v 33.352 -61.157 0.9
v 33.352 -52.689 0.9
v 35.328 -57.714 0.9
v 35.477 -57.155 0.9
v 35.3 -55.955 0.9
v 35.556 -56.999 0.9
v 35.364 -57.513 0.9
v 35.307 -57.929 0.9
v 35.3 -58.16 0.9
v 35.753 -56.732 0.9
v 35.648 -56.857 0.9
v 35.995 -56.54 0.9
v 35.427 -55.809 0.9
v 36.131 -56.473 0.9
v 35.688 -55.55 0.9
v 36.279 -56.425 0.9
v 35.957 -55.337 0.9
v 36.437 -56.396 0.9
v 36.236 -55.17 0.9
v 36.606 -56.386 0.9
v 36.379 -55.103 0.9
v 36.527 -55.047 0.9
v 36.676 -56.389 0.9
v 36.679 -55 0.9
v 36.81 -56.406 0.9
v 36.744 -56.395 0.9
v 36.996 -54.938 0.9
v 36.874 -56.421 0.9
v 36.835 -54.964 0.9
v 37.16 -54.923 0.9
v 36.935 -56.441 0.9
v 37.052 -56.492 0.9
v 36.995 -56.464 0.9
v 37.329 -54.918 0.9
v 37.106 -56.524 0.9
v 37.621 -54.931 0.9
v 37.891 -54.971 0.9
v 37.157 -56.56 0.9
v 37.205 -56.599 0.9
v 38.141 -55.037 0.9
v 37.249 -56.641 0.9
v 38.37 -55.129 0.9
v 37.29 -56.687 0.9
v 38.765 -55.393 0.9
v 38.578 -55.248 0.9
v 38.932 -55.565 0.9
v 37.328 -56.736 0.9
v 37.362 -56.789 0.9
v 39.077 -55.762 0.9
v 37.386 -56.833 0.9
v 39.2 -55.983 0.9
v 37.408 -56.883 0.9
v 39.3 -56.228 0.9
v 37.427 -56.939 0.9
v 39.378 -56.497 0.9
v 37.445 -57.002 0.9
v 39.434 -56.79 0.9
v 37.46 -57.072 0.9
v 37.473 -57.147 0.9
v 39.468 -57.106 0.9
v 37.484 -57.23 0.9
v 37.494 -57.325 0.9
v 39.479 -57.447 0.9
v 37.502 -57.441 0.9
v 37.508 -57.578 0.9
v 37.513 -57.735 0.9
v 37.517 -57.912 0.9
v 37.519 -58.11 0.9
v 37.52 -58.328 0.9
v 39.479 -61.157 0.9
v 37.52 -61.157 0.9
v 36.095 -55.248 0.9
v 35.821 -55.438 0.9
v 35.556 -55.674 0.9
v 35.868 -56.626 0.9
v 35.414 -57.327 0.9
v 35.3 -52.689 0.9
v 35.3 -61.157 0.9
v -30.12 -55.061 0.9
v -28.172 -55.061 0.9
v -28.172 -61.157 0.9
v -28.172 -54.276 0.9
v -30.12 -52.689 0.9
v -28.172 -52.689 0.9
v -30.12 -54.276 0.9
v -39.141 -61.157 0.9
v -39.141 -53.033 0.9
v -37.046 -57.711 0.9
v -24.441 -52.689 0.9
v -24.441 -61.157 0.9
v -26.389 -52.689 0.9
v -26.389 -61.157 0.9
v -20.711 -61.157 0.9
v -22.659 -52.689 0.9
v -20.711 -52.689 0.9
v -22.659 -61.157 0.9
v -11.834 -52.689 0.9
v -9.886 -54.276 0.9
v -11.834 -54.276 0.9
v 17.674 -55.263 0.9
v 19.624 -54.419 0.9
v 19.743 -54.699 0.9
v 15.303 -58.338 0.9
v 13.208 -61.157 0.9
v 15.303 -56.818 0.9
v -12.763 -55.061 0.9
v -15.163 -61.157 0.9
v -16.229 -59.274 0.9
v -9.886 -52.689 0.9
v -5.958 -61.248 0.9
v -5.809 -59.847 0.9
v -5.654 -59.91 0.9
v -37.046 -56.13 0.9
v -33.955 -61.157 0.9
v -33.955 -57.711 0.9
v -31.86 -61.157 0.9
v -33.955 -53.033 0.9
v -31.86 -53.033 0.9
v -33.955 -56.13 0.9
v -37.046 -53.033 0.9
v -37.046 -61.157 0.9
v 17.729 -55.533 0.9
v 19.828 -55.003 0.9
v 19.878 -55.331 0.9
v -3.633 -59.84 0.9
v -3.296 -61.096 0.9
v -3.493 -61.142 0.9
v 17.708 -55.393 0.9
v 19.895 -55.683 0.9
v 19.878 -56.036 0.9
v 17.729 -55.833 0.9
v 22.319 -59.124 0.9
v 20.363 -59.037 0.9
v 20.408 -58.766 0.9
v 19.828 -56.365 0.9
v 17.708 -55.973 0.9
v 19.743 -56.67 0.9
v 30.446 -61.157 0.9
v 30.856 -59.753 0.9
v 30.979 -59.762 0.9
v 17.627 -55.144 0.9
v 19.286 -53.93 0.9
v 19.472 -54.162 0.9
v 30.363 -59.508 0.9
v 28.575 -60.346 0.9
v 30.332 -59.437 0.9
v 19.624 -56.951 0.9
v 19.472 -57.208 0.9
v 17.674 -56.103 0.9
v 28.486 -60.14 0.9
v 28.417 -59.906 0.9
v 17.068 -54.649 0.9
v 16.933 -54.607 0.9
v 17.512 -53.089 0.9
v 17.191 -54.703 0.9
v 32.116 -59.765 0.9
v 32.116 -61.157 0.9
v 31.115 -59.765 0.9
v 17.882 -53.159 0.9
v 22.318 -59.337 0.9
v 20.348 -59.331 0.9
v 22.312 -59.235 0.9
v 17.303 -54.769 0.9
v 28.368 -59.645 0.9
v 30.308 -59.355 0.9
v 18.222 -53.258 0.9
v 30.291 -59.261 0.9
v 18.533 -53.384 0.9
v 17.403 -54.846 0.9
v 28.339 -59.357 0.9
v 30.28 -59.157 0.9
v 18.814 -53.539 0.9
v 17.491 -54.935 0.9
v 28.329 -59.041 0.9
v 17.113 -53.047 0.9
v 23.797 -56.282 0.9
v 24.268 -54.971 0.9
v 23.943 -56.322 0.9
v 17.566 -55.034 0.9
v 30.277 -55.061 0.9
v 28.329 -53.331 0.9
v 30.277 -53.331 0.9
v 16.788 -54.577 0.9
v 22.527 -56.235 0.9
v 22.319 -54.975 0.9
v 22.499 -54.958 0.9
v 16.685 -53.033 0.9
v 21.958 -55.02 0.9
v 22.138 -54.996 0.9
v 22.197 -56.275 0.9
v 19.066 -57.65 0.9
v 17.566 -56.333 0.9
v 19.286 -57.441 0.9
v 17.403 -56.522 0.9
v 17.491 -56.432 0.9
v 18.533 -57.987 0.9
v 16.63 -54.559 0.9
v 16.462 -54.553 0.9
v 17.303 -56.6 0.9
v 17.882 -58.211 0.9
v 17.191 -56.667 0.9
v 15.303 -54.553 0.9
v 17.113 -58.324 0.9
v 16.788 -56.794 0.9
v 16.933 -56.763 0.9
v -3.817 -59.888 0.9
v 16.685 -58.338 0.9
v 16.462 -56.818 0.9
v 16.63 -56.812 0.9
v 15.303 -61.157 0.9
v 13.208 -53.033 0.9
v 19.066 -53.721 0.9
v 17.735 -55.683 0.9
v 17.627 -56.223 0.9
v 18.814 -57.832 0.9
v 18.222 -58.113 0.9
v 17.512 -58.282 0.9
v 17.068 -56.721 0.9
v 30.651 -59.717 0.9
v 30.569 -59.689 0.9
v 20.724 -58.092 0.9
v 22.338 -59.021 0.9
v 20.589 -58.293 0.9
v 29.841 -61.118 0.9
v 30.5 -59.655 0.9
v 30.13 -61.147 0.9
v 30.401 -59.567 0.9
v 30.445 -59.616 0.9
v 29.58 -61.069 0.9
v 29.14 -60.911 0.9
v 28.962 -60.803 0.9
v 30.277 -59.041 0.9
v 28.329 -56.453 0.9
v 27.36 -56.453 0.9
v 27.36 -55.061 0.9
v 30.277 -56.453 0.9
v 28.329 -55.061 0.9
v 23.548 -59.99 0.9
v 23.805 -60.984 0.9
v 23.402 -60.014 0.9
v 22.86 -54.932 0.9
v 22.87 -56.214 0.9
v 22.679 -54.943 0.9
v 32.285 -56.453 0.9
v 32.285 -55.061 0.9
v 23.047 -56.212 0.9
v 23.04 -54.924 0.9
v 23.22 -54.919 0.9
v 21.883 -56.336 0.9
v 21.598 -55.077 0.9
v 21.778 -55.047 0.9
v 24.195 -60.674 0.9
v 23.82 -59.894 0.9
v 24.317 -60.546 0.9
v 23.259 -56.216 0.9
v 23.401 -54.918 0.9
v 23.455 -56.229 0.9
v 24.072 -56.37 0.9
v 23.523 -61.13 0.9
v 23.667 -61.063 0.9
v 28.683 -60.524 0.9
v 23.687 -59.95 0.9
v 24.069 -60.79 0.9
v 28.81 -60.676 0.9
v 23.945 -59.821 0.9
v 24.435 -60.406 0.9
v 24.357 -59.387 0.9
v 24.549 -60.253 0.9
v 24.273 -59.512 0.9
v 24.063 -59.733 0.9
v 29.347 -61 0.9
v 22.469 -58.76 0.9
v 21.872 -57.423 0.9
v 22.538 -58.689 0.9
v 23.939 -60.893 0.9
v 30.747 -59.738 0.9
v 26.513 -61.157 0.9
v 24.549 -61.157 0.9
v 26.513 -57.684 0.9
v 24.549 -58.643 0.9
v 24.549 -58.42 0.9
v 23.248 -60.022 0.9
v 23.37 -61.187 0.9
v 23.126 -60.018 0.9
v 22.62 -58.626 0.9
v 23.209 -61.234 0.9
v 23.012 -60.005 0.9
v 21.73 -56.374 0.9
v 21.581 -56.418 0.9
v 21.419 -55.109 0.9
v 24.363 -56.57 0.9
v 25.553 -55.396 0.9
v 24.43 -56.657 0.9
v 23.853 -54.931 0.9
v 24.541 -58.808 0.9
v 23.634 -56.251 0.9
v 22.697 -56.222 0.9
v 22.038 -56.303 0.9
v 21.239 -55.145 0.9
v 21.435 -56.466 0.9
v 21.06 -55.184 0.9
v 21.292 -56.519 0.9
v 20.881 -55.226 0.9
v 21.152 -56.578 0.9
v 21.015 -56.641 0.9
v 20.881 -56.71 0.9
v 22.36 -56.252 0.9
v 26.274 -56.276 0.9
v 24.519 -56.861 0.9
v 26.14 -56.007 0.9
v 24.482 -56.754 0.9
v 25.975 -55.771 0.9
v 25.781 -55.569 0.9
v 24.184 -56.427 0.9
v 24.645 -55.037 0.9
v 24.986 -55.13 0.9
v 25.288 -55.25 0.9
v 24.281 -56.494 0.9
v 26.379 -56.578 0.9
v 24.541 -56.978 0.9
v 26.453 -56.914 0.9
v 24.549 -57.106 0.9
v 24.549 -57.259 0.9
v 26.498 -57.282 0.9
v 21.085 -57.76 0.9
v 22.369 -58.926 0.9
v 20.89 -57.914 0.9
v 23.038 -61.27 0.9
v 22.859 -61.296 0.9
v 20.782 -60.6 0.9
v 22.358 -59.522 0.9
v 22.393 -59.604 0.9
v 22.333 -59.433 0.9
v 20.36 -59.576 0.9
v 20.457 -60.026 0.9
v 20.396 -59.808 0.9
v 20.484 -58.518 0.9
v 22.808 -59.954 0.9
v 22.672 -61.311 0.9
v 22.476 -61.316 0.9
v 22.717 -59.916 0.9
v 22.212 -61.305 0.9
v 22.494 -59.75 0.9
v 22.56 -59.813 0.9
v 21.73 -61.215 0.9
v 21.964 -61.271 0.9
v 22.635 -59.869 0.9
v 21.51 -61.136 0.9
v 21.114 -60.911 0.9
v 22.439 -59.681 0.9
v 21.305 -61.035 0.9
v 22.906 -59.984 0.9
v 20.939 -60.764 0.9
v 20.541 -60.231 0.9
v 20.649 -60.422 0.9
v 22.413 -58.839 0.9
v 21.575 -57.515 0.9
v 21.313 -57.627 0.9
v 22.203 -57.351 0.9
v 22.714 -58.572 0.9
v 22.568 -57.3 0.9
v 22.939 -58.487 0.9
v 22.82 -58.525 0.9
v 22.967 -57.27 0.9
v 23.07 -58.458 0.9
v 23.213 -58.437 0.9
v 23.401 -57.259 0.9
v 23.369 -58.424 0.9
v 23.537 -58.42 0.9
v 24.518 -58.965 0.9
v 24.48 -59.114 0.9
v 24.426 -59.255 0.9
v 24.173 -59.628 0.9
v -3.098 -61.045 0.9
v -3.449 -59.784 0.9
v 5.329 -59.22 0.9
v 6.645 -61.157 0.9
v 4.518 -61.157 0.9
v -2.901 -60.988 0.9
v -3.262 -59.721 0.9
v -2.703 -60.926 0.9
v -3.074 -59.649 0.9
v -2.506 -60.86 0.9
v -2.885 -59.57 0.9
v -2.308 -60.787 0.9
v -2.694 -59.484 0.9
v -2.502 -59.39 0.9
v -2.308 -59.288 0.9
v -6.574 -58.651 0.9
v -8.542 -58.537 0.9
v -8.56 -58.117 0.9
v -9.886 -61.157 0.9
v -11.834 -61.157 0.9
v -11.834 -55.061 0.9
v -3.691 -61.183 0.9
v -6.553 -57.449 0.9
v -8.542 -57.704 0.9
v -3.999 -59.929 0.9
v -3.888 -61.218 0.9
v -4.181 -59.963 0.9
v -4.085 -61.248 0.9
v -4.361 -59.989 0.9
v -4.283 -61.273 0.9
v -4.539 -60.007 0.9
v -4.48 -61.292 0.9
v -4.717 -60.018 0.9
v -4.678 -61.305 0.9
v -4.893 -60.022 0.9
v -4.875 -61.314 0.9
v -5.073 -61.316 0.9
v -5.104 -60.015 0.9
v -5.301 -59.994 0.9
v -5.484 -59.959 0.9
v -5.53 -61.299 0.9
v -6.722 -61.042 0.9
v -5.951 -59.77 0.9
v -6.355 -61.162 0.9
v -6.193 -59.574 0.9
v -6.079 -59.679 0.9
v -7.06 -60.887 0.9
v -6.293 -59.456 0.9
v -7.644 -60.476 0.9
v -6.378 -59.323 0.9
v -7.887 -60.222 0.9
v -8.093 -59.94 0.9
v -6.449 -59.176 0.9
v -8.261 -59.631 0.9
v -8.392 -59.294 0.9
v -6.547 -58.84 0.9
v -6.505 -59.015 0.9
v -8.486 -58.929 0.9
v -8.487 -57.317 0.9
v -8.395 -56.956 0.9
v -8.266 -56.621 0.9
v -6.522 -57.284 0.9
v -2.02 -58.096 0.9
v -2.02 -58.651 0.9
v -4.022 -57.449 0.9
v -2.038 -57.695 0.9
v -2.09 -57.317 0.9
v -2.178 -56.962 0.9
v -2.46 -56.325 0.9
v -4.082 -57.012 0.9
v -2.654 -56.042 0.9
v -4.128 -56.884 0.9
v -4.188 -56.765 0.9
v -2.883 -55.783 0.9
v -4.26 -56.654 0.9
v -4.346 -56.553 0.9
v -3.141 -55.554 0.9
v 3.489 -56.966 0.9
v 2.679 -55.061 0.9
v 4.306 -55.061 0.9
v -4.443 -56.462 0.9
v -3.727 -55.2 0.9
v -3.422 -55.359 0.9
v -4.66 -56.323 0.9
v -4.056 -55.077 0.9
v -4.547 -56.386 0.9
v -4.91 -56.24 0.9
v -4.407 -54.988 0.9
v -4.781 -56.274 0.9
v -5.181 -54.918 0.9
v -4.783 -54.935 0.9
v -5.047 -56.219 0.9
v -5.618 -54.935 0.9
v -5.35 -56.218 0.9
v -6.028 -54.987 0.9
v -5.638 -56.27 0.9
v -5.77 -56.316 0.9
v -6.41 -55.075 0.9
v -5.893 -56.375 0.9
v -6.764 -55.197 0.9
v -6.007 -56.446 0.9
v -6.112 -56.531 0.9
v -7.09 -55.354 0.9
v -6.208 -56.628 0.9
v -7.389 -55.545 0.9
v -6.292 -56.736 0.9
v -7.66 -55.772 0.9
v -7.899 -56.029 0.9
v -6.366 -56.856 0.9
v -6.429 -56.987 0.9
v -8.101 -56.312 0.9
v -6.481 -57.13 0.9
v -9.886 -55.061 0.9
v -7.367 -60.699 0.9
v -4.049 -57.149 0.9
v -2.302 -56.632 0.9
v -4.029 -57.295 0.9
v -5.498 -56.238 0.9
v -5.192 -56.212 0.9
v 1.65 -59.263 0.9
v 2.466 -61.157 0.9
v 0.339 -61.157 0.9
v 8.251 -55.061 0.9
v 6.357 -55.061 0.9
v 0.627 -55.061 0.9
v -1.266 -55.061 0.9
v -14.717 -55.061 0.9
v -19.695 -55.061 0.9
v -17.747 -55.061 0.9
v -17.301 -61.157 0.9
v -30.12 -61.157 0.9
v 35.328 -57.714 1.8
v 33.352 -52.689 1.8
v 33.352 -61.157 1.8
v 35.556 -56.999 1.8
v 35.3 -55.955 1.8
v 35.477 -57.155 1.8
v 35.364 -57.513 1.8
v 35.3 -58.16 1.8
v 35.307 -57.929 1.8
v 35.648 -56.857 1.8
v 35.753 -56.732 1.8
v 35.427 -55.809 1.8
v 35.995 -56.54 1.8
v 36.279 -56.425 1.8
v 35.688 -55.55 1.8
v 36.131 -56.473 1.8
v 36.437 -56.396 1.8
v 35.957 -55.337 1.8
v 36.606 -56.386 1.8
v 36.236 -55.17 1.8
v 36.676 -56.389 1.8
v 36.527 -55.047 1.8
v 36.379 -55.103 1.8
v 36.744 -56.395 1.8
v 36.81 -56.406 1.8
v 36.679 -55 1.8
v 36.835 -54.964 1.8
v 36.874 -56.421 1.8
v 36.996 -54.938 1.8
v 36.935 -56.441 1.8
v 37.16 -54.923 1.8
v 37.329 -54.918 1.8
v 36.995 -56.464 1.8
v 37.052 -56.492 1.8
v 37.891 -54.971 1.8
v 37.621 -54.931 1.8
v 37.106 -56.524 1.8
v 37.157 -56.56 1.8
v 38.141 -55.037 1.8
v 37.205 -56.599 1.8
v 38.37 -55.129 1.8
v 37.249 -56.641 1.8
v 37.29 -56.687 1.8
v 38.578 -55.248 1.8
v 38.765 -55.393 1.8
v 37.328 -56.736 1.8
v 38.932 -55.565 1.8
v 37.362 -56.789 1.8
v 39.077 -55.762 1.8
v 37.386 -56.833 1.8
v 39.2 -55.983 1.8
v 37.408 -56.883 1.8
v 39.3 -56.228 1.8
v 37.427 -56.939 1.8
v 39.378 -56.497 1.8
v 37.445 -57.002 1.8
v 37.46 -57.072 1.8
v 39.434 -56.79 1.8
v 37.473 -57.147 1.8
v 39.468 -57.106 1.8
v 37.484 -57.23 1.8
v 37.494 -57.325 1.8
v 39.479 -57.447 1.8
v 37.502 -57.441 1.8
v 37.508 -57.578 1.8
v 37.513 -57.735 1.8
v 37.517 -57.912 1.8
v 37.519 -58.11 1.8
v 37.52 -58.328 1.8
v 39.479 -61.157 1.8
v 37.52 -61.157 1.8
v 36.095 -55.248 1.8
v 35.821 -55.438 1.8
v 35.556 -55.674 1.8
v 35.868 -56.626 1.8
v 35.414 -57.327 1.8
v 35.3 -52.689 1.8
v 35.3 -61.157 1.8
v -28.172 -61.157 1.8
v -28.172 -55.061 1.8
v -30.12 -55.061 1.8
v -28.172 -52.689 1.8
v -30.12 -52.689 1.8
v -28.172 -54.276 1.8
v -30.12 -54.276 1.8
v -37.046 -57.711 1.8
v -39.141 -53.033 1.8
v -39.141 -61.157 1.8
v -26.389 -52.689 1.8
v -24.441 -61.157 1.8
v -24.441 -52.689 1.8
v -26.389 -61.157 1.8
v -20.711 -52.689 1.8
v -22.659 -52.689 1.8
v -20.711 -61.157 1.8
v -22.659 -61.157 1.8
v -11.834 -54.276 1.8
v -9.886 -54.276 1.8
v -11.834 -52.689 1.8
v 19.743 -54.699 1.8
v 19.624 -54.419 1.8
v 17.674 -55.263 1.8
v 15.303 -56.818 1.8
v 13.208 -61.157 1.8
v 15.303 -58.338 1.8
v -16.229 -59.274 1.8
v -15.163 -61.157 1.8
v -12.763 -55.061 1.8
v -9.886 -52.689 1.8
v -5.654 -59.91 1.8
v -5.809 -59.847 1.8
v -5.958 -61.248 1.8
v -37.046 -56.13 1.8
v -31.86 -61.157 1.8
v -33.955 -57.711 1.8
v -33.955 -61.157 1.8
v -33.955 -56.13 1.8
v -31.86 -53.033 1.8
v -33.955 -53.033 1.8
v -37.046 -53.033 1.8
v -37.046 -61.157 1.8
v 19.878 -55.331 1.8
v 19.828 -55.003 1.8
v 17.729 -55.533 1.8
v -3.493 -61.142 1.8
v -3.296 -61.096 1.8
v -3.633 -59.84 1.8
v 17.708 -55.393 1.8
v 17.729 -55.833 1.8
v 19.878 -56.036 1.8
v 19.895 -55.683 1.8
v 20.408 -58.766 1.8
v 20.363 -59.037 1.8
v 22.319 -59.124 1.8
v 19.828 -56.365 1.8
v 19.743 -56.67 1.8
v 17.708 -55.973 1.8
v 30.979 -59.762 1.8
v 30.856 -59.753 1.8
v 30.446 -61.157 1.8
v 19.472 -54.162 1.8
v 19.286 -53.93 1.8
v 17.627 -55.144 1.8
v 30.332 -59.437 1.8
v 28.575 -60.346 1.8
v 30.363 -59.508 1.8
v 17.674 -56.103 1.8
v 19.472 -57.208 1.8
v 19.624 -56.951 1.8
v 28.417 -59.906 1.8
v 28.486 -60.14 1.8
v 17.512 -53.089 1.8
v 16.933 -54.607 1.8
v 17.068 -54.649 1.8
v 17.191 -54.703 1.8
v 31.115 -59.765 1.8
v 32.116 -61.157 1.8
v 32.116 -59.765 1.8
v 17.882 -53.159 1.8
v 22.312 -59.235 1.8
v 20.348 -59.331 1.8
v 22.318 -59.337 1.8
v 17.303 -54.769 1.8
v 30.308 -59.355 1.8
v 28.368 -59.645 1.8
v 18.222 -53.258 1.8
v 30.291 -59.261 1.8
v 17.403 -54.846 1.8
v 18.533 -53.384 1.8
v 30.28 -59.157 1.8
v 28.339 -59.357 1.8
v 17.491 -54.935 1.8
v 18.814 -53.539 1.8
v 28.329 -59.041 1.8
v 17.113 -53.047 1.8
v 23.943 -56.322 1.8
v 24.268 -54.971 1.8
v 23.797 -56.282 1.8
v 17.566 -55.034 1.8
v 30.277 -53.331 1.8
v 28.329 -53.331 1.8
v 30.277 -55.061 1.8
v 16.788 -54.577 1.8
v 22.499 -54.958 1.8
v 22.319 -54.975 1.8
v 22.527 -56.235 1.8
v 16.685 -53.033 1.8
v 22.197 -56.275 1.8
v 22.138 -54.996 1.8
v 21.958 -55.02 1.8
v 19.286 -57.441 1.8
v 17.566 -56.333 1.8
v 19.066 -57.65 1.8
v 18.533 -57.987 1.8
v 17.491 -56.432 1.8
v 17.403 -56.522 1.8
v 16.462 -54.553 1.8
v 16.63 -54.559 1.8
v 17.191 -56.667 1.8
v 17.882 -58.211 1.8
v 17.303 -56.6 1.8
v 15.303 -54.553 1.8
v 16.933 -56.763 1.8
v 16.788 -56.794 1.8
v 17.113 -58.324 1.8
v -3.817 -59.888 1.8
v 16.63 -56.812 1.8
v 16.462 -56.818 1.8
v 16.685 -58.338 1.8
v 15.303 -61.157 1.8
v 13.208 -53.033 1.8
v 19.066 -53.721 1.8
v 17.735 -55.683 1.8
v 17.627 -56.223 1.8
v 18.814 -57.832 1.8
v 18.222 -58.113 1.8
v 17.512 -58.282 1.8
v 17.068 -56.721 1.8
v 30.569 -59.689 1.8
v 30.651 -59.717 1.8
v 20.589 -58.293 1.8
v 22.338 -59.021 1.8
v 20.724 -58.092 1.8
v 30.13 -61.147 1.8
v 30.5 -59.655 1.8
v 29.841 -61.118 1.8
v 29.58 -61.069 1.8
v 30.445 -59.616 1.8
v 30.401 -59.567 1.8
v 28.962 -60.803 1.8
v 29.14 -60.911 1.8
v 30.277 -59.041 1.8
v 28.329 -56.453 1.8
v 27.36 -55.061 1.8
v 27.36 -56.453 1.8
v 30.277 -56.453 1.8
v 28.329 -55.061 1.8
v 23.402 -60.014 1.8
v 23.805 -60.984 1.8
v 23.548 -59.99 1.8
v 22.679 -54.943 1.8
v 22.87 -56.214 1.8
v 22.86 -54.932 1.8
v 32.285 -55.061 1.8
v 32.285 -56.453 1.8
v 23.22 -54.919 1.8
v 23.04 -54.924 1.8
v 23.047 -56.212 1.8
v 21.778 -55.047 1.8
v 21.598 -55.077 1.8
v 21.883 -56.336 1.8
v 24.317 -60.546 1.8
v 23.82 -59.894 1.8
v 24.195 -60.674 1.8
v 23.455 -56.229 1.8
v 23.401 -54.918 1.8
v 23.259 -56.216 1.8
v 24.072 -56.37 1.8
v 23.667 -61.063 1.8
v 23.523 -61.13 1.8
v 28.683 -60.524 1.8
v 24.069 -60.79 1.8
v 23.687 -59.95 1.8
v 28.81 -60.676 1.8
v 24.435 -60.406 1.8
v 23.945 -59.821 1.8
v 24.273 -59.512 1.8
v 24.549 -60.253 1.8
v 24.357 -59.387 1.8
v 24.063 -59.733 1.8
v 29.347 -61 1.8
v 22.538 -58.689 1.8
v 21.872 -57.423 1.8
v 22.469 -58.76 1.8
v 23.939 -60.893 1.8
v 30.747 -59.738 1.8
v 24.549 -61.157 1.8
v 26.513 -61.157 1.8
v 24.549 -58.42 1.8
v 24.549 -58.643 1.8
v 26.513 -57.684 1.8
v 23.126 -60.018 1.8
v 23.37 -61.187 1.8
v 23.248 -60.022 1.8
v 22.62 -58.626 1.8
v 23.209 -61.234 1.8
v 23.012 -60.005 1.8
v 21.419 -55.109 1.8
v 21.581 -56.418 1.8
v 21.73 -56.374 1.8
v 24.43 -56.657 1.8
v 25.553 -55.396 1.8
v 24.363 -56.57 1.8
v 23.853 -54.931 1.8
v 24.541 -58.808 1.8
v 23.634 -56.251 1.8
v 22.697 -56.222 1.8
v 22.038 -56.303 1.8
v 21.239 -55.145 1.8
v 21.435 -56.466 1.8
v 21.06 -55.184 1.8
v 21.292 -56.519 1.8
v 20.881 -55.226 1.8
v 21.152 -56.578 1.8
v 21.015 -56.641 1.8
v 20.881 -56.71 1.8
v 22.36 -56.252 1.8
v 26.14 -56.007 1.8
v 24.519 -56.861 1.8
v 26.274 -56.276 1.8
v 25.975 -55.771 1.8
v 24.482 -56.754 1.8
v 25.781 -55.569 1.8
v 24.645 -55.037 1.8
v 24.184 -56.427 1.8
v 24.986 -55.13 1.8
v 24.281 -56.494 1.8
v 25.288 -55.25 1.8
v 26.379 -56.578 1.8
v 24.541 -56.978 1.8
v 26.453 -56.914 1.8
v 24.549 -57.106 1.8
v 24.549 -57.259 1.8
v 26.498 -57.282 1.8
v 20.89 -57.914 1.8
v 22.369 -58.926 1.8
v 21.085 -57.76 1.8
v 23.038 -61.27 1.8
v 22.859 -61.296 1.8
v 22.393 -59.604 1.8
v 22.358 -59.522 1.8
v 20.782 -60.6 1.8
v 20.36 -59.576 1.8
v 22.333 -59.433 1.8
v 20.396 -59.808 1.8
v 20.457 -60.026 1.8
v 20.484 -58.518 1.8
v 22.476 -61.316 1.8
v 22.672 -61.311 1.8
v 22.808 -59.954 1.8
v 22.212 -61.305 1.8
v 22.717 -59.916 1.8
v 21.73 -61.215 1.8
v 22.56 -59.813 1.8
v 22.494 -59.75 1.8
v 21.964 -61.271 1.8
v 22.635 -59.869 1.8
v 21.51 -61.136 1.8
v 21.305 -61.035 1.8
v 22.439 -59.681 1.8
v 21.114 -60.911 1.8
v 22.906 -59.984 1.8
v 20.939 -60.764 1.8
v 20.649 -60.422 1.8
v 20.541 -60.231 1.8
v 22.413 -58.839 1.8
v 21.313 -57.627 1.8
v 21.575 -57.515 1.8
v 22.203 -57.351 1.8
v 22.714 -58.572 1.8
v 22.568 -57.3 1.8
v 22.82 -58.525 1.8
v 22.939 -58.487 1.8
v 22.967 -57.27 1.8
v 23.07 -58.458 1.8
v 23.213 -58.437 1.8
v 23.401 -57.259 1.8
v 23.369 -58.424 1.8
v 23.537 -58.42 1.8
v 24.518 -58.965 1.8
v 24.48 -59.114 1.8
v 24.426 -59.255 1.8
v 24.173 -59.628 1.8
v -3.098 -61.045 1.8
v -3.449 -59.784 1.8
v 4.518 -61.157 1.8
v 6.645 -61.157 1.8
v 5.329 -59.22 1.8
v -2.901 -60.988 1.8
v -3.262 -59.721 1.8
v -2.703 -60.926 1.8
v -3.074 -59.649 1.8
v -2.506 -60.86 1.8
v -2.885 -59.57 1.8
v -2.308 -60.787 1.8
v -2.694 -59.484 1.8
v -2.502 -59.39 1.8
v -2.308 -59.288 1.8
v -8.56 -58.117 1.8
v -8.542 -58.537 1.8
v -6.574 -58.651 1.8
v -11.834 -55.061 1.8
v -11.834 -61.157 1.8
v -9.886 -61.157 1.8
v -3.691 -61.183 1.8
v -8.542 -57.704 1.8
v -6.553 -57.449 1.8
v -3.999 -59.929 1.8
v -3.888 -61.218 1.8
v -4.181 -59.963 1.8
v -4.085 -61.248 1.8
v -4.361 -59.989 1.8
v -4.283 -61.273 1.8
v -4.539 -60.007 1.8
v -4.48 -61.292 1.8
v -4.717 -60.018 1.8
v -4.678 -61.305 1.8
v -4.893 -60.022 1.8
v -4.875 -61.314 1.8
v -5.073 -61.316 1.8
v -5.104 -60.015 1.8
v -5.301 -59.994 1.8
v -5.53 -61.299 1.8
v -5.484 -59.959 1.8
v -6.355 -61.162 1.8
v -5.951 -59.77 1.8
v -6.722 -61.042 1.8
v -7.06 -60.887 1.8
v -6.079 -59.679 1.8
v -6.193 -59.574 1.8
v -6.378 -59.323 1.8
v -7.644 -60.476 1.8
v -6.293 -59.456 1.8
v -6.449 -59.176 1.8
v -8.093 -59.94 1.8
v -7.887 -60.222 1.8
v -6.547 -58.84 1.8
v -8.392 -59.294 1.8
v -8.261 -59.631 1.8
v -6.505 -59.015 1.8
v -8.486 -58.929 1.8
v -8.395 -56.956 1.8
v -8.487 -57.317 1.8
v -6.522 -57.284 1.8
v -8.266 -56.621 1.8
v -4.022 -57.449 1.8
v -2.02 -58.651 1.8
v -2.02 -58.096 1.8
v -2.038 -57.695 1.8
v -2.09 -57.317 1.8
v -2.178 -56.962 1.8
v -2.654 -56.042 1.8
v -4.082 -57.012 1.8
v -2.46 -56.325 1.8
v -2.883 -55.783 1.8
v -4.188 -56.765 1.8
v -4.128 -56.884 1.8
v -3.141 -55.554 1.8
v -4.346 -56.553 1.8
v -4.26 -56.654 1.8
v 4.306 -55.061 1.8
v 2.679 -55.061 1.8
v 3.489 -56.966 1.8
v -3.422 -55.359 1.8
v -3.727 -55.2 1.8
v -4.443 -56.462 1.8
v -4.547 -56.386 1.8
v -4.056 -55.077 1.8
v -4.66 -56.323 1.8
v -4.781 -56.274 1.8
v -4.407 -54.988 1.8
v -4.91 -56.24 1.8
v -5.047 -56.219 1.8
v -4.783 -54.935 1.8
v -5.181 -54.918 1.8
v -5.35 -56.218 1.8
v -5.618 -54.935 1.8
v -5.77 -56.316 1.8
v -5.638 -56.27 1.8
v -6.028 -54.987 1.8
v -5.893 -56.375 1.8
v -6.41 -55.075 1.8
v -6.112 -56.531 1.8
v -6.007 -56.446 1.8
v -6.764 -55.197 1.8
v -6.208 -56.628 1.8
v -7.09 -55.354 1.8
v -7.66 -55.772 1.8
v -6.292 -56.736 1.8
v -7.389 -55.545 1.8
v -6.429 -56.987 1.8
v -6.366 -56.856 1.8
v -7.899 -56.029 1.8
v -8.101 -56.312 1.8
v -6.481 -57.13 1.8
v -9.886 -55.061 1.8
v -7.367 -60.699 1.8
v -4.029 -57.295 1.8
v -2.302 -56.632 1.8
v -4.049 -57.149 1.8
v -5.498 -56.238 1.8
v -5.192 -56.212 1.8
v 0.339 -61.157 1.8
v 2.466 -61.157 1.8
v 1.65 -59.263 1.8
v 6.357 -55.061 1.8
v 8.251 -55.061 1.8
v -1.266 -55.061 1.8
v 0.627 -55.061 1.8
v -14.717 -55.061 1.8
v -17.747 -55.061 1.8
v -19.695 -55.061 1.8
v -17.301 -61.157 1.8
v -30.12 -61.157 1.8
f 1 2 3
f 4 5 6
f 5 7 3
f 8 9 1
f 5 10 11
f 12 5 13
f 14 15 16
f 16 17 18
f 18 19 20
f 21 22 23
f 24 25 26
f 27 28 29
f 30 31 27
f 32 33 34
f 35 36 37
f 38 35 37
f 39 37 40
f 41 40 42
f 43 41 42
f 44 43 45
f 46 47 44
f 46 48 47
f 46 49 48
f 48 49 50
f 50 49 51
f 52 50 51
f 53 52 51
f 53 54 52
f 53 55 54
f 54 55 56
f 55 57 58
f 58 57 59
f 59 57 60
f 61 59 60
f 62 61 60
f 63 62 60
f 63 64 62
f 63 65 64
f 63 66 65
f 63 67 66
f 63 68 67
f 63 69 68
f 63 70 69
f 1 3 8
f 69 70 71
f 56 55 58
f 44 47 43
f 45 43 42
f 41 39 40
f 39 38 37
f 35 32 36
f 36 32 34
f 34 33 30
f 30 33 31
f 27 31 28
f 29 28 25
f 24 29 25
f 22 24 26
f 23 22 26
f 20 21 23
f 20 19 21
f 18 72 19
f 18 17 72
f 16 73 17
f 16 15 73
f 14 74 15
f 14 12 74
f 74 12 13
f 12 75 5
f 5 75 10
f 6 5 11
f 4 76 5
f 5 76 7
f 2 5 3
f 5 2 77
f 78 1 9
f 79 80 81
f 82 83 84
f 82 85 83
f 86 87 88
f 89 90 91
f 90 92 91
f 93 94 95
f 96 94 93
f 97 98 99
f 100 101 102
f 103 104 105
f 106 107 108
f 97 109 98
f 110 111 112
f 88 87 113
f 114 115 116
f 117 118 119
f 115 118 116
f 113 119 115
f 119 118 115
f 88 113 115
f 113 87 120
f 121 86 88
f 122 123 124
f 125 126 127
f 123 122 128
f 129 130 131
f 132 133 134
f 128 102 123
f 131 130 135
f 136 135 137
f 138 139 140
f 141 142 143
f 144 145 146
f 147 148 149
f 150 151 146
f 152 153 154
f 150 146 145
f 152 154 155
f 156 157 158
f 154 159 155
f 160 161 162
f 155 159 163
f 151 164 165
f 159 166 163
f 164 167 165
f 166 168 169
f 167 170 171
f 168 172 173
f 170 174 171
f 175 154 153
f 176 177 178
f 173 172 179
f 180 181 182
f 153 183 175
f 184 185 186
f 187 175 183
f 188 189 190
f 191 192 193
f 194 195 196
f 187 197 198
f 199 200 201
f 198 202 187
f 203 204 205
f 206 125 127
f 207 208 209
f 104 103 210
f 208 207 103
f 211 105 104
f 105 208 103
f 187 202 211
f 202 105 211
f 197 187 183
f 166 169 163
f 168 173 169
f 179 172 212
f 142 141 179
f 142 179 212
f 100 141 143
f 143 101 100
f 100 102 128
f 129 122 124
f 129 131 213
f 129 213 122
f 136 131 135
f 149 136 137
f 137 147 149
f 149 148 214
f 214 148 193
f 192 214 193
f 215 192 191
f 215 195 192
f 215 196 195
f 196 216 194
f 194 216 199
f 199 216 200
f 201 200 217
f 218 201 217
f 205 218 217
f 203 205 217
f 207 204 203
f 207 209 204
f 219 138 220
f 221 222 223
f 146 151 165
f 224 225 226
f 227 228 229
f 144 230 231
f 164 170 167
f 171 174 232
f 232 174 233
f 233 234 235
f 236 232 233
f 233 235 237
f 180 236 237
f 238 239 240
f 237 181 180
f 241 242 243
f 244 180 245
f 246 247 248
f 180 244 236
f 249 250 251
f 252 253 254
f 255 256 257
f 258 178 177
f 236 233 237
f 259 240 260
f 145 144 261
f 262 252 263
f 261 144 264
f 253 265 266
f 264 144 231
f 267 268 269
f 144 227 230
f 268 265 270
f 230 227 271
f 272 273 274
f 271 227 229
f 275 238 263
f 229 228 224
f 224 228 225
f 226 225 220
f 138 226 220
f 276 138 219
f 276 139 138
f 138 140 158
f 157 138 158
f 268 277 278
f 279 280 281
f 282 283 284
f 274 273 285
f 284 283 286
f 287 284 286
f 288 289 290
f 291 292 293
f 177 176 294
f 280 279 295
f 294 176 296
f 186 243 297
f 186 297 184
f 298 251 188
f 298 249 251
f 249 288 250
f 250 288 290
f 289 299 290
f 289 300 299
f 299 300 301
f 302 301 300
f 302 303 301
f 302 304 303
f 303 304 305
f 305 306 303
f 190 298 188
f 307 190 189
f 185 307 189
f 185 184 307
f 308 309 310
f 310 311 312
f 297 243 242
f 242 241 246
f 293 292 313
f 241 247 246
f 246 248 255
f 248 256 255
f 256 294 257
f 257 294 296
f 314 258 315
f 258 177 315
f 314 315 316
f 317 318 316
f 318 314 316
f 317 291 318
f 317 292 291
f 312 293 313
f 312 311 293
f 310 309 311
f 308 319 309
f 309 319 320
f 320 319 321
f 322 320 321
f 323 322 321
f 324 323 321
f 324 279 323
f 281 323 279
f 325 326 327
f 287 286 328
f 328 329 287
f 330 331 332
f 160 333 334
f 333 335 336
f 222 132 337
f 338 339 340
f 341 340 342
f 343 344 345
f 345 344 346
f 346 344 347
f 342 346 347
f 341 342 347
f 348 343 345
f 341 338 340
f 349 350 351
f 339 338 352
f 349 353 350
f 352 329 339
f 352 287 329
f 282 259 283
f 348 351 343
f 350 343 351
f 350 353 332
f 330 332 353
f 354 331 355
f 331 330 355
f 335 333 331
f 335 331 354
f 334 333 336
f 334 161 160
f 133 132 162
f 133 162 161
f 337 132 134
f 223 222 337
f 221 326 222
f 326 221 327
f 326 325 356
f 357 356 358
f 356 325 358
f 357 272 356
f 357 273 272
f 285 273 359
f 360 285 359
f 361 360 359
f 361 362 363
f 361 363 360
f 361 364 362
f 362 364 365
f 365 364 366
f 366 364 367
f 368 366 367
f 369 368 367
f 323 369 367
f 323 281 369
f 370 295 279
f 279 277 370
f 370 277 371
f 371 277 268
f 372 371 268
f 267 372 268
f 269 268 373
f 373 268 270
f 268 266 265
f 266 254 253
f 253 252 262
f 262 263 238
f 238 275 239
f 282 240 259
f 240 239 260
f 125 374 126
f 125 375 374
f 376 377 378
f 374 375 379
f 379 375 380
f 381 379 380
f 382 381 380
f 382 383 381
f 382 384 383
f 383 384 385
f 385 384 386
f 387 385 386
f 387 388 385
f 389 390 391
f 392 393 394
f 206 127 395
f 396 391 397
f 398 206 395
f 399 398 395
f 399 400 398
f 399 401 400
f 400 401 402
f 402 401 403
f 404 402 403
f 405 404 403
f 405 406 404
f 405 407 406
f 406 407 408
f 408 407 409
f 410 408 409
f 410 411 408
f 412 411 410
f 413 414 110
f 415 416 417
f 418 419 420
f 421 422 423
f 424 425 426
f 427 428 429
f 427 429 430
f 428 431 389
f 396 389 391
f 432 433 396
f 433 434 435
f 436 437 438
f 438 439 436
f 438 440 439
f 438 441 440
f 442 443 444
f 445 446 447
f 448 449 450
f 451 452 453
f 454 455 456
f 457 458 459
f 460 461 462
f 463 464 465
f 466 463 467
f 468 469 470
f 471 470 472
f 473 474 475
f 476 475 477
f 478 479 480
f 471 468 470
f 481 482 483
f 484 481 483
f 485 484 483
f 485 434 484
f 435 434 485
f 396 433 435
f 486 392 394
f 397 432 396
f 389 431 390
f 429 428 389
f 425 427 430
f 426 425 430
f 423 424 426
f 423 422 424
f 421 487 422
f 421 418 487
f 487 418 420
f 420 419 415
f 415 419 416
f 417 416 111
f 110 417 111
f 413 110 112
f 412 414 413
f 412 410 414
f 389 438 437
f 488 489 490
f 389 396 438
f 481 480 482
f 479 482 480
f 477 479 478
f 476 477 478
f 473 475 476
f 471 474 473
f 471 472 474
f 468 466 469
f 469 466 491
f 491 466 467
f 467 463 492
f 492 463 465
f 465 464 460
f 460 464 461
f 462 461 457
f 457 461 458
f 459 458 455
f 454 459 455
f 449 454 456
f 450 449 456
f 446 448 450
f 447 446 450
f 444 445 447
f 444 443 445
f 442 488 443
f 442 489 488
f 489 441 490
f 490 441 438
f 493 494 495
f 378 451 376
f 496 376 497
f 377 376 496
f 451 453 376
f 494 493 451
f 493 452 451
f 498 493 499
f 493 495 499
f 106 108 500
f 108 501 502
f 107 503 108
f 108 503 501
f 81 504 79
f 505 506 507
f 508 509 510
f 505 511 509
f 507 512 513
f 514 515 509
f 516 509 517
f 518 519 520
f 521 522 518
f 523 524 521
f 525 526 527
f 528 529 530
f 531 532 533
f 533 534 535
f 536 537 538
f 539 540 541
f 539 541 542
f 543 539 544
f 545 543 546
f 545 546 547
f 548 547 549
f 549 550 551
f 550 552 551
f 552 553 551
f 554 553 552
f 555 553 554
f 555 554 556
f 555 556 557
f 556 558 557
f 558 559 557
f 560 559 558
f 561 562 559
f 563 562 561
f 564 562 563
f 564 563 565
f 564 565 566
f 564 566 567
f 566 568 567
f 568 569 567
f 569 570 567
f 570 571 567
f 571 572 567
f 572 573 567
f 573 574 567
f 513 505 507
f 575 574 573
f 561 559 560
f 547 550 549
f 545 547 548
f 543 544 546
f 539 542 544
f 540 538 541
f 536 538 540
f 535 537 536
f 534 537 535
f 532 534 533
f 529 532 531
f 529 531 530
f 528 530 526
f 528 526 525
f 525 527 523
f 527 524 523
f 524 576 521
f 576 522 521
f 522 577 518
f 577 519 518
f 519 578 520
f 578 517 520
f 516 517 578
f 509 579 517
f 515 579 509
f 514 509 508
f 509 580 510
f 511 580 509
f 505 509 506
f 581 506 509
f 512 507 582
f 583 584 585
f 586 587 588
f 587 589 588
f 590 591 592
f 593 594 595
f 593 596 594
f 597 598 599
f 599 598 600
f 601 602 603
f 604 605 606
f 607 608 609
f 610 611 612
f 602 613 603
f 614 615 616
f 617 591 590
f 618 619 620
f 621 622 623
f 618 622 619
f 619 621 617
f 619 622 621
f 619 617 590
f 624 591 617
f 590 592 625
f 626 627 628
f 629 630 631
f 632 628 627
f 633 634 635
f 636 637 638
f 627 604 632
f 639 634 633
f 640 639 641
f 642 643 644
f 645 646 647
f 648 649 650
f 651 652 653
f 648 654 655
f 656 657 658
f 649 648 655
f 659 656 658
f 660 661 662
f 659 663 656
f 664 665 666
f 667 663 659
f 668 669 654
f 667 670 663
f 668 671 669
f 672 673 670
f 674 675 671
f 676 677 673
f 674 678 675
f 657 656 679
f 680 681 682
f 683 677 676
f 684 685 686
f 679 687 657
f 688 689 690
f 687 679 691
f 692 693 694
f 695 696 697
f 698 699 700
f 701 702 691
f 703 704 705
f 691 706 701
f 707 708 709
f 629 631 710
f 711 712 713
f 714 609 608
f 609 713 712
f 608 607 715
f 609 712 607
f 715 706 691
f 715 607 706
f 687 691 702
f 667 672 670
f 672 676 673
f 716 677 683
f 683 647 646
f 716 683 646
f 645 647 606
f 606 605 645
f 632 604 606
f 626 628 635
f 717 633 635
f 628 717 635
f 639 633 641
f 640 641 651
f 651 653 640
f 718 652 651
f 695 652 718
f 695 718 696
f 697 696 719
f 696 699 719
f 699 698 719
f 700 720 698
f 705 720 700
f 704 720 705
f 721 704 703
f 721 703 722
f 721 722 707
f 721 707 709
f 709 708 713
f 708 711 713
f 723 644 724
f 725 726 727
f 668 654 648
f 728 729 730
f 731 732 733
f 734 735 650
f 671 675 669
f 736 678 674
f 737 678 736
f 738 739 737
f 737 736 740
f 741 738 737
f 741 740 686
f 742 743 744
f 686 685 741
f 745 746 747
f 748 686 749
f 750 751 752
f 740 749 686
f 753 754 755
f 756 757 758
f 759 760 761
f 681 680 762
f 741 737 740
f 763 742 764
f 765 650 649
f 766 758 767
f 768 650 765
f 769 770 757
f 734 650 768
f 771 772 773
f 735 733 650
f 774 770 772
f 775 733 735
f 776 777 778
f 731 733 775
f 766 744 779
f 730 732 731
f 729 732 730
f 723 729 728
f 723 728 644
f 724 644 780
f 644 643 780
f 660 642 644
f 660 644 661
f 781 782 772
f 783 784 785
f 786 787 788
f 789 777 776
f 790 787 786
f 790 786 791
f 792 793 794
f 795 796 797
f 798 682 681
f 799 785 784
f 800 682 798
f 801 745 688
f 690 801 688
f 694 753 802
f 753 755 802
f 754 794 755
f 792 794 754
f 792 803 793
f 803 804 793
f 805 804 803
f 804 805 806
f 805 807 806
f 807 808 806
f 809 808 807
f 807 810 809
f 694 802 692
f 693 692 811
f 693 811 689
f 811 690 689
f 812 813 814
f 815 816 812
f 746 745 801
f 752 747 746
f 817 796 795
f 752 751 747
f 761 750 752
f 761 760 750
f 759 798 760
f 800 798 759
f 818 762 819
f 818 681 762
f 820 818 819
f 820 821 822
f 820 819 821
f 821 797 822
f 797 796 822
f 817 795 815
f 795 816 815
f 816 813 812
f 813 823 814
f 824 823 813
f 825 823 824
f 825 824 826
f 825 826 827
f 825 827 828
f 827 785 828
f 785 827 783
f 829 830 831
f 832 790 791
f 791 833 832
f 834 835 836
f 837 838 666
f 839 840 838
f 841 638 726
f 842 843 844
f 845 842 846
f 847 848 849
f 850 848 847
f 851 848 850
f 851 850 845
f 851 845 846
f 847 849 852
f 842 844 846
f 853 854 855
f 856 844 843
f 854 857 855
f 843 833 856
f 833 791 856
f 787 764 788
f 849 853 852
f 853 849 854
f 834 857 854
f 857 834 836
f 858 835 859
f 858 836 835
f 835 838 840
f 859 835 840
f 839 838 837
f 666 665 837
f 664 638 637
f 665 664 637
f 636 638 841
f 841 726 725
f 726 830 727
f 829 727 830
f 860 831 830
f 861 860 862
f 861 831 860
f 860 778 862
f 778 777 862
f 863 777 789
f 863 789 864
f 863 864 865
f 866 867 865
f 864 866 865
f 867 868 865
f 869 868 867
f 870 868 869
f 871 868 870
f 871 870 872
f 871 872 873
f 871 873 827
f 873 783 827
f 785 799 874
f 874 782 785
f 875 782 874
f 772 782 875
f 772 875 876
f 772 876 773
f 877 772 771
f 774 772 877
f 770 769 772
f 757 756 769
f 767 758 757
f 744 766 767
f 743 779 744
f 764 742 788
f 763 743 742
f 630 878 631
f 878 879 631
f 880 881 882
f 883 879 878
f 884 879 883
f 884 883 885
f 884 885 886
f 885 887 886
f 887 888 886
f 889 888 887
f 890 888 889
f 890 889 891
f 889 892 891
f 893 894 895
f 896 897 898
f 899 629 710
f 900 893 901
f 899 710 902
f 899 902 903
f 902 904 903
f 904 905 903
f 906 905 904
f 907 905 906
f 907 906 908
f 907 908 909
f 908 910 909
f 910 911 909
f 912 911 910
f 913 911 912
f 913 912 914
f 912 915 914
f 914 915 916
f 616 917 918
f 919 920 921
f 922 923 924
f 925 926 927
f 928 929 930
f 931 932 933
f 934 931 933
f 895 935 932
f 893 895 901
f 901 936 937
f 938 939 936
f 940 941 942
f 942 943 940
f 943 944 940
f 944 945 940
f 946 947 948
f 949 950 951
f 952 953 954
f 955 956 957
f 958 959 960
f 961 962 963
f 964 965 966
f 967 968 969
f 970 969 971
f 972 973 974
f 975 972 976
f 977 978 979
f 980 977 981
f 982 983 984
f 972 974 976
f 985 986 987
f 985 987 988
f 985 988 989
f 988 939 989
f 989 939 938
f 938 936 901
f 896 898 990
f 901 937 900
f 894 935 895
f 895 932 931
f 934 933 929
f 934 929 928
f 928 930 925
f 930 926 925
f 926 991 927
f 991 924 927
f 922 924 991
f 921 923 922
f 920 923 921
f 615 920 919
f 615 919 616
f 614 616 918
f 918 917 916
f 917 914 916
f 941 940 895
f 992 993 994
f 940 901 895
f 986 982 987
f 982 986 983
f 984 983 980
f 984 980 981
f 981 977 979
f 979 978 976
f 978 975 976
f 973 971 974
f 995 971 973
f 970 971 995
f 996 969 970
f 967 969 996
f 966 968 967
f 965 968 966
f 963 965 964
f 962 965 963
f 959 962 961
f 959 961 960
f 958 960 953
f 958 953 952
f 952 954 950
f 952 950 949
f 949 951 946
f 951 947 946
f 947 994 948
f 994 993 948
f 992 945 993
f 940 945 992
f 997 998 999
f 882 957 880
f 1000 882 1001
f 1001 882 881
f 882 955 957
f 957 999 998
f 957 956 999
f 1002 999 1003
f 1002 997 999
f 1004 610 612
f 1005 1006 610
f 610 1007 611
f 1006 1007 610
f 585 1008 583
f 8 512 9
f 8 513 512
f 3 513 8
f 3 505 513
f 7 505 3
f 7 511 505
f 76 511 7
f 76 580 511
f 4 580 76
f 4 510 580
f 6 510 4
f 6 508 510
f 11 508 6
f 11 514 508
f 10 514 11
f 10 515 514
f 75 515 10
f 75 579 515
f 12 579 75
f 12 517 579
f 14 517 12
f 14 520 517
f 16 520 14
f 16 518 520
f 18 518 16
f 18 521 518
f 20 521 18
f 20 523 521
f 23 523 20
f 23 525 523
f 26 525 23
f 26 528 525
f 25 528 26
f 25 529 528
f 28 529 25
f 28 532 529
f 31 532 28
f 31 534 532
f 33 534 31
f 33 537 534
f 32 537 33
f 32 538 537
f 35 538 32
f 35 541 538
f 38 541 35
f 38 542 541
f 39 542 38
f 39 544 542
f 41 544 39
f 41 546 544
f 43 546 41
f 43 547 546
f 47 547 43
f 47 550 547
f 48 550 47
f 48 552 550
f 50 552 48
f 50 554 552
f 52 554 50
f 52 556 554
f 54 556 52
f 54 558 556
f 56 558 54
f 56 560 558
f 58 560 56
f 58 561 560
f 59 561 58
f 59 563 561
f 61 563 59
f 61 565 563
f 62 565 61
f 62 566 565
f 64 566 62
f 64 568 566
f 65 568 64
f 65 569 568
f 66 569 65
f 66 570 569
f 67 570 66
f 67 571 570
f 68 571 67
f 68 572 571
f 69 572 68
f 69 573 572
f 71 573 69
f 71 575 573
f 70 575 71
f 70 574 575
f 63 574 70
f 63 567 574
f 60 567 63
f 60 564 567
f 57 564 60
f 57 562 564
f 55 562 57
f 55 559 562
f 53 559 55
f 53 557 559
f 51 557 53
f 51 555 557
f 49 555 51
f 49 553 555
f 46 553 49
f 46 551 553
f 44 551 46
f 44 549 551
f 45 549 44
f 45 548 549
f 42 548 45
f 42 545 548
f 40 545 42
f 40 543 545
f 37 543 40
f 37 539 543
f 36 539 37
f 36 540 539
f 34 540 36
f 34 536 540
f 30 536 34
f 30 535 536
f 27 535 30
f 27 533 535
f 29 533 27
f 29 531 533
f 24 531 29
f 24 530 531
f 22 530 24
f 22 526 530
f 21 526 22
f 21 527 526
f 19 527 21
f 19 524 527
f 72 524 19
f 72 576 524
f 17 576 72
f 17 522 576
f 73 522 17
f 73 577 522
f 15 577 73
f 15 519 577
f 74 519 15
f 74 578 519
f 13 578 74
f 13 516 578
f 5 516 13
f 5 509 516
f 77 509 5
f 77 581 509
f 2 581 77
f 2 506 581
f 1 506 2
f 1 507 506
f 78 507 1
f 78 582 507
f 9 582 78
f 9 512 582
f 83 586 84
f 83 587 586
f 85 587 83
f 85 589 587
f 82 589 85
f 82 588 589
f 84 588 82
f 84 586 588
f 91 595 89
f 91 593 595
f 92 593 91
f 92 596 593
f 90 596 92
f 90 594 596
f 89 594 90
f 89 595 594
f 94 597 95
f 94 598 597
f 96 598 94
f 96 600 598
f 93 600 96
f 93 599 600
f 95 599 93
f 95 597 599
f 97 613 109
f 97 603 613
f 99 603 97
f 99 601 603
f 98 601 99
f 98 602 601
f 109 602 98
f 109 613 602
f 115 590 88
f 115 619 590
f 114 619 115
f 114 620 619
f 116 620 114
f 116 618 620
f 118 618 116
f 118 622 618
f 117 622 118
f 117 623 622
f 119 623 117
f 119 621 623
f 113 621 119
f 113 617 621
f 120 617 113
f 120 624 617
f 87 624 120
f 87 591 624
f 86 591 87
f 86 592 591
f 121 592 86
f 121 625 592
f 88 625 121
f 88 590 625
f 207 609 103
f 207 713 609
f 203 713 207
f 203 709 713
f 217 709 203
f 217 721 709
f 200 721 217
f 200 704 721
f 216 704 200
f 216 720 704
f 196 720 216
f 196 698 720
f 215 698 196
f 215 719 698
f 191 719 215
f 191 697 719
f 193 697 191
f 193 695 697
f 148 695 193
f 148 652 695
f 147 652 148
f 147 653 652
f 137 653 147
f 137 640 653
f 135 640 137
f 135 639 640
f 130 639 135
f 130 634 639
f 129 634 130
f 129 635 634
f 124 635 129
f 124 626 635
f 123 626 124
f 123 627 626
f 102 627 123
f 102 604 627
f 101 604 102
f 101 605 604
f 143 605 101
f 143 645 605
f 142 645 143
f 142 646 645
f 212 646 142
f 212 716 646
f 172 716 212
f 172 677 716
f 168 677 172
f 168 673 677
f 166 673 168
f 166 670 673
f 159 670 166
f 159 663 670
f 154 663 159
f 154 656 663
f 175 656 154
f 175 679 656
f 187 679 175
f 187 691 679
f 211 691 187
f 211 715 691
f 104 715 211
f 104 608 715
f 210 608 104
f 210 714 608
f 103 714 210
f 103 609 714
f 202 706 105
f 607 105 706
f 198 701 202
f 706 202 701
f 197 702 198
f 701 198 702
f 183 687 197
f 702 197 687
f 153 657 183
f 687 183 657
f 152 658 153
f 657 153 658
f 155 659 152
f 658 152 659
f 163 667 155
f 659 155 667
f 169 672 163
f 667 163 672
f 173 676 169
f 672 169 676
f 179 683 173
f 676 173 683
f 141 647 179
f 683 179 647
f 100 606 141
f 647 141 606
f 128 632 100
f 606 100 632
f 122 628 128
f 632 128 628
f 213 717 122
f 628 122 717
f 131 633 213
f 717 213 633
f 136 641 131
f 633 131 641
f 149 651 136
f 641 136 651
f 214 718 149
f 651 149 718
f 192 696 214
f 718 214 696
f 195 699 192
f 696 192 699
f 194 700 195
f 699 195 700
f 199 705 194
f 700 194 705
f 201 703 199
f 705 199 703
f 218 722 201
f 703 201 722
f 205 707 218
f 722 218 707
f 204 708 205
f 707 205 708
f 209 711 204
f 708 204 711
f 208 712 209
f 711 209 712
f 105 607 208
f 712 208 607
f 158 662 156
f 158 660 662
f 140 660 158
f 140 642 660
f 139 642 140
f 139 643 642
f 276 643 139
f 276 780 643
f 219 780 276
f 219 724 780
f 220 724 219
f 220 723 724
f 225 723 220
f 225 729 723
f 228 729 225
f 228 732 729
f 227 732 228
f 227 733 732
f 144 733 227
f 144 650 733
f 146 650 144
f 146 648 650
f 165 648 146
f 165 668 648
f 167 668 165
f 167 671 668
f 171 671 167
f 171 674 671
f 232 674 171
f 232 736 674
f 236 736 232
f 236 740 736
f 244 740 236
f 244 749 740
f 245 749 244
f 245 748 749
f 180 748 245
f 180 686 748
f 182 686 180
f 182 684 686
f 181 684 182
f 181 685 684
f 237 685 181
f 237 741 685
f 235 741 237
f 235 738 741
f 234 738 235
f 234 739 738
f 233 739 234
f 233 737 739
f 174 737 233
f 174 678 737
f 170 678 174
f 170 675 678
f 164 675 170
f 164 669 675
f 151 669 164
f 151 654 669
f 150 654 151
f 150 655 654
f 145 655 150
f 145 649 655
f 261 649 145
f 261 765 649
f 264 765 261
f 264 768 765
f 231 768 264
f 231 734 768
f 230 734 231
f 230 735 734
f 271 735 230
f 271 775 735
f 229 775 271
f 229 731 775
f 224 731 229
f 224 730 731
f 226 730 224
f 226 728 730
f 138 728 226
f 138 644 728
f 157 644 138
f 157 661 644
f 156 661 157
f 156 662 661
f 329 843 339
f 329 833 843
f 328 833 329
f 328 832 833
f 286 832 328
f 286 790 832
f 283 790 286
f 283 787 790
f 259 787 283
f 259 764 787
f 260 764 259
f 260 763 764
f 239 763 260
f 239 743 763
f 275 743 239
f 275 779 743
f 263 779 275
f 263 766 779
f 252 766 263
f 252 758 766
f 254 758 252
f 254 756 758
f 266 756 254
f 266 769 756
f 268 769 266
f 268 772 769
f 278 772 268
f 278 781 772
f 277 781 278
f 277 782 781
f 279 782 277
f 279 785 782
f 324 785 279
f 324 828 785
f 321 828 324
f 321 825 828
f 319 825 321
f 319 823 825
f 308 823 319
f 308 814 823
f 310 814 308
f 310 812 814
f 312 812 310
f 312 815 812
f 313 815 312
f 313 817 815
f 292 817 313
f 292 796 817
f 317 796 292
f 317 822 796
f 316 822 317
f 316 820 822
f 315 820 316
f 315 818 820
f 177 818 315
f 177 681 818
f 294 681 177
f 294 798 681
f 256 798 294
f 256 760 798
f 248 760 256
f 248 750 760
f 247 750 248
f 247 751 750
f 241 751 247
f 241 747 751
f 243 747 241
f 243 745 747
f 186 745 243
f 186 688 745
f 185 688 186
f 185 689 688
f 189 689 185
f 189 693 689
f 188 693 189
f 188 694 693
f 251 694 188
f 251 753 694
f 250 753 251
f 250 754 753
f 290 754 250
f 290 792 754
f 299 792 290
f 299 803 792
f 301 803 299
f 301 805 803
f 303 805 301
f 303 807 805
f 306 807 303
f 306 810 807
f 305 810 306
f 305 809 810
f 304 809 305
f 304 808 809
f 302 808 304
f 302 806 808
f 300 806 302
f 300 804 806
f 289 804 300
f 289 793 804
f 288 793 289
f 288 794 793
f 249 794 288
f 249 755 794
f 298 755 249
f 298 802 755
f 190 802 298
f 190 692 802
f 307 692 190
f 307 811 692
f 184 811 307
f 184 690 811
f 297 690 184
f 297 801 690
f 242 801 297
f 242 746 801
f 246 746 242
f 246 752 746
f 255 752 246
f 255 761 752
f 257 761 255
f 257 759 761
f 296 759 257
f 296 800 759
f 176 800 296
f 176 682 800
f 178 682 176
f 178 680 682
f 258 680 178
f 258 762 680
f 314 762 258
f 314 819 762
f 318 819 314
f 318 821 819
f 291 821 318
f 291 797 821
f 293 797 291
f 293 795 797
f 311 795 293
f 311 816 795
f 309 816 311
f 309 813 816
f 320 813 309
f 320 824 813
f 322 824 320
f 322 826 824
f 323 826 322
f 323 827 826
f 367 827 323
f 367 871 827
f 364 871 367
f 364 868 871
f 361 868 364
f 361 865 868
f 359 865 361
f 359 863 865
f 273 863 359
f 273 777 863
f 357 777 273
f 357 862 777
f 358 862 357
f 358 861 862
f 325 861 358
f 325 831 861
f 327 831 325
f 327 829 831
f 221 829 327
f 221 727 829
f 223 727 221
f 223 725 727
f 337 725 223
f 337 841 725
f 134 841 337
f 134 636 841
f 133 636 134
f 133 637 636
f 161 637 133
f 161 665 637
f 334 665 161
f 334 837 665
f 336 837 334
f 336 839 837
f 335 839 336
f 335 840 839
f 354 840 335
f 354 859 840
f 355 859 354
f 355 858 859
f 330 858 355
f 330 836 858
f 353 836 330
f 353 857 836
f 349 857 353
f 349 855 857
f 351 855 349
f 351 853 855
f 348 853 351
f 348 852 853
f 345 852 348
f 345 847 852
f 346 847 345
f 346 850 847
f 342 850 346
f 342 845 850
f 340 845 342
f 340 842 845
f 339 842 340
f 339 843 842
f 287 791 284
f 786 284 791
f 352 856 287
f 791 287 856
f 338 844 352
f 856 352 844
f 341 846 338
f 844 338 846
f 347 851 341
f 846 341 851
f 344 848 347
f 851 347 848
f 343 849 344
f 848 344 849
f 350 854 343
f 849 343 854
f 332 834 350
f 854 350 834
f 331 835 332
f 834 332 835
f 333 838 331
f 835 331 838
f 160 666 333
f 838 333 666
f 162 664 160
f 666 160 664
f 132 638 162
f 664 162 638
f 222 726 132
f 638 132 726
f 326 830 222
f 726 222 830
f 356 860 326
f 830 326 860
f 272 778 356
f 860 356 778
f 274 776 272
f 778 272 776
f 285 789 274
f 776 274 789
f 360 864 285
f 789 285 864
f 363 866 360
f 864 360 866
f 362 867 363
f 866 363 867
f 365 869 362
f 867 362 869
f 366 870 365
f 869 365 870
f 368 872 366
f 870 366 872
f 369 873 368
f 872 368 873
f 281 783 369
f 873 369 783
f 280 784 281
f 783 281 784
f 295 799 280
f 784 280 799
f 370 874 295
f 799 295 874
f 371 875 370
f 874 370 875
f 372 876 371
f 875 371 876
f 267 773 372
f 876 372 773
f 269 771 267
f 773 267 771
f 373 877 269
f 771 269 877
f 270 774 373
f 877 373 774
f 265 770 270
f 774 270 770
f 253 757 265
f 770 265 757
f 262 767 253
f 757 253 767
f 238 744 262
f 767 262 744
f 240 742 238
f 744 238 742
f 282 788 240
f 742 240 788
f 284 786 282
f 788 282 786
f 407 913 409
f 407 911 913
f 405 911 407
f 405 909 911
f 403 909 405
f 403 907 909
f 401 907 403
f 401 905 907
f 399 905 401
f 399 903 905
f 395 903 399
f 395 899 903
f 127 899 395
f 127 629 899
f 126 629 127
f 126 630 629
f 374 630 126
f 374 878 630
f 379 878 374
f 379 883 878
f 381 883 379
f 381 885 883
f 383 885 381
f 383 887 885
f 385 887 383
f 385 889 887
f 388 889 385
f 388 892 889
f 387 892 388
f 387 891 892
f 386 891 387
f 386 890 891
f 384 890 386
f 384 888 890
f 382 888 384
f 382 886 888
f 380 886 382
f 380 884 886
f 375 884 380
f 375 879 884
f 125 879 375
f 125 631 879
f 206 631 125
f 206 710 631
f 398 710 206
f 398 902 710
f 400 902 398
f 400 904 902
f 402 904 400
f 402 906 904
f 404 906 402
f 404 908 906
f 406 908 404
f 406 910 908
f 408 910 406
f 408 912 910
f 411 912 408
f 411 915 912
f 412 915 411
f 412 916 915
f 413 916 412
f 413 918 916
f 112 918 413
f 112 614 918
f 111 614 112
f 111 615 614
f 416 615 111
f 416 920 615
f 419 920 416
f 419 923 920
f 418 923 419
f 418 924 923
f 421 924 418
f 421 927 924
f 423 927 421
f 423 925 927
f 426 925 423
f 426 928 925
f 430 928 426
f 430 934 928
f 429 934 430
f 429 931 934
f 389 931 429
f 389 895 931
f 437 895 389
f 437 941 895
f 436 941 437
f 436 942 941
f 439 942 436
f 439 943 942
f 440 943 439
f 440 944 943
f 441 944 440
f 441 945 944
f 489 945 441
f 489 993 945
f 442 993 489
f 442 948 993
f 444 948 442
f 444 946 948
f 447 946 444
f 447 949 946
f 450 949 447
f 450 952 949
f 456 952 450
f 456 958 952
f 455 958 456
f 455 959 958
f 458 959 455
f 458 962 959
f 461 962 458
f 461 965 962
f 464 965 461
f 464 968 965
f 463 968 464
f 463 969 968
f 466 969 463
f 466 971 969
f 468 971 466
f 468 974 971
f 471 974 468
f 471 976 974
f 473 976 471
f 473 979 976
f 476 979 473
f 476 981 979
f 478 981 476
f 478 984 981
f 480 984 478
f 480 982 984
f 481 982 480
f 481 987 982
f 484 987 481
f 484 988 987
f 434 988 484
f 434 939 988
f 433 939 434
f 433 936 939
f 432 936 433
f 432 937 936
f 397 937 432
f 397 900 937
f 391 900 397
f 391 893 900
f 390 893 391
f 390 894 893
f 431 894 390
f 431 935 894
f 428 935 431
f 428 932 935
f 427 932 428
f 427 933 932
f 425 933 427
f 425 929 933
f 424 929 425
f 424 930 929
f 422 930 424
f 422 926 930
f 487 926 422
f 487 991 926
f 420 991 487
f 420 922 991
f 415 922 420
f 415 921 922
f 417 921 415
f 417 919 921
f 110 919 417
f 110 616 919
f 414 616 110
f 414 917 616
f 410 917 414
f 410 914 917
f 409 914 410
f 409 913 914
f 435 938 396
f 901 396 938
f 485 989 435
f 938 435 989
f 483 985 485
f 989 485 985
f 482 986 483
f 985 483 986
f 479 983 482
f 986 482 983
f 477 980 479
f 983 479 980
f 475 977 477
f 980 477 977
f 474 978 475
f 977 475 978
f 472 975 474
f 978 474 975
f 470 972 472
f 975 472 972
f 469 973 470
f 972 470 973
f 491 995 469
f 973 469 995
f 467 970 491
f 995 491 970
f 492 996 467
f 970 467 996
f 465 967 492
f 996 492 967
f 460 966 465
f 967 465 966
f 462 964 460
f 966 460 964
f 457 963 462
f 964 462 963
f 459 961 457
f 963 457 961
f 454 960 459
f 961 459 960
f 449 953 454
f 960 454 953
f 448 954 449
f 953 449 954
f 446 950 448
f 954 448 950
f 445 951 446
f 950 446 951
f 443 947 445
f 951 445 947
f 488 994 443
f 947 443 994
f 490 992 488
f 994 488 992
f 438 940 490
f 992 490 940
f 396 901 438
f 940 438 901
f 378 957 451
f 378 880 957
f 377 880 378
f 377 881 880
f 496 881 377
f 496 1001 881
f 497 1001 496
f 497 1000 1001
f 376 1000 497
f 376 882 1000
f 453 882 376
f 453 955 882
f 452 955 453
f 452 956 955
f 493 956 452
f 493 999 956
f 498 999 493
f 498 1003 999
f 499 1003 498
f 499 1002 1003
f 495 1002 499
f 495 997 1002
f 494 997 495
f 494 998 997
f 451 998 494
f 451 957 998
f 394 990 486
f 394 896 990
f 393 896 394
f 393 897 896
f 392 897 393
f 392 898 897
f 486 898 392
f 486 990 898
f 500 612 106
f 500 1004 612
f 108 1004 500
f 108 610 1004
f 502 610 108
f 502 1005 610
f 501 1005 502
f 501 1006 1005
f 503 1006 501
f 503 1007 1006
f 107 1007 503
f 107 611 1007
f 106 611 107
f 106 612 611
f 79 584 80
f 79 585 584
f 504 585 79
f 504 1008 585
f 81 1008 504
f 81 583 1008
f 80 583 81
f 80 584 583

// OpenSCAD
$fn = 48;
  // English (below bottom hole)
  translate([0, -57.100, 0.900]) linear_extrude(height=0.900) text("Hillview Path", size=8.024, halign="center", valign="center", font="Helvetica Neue:style=Bold");
